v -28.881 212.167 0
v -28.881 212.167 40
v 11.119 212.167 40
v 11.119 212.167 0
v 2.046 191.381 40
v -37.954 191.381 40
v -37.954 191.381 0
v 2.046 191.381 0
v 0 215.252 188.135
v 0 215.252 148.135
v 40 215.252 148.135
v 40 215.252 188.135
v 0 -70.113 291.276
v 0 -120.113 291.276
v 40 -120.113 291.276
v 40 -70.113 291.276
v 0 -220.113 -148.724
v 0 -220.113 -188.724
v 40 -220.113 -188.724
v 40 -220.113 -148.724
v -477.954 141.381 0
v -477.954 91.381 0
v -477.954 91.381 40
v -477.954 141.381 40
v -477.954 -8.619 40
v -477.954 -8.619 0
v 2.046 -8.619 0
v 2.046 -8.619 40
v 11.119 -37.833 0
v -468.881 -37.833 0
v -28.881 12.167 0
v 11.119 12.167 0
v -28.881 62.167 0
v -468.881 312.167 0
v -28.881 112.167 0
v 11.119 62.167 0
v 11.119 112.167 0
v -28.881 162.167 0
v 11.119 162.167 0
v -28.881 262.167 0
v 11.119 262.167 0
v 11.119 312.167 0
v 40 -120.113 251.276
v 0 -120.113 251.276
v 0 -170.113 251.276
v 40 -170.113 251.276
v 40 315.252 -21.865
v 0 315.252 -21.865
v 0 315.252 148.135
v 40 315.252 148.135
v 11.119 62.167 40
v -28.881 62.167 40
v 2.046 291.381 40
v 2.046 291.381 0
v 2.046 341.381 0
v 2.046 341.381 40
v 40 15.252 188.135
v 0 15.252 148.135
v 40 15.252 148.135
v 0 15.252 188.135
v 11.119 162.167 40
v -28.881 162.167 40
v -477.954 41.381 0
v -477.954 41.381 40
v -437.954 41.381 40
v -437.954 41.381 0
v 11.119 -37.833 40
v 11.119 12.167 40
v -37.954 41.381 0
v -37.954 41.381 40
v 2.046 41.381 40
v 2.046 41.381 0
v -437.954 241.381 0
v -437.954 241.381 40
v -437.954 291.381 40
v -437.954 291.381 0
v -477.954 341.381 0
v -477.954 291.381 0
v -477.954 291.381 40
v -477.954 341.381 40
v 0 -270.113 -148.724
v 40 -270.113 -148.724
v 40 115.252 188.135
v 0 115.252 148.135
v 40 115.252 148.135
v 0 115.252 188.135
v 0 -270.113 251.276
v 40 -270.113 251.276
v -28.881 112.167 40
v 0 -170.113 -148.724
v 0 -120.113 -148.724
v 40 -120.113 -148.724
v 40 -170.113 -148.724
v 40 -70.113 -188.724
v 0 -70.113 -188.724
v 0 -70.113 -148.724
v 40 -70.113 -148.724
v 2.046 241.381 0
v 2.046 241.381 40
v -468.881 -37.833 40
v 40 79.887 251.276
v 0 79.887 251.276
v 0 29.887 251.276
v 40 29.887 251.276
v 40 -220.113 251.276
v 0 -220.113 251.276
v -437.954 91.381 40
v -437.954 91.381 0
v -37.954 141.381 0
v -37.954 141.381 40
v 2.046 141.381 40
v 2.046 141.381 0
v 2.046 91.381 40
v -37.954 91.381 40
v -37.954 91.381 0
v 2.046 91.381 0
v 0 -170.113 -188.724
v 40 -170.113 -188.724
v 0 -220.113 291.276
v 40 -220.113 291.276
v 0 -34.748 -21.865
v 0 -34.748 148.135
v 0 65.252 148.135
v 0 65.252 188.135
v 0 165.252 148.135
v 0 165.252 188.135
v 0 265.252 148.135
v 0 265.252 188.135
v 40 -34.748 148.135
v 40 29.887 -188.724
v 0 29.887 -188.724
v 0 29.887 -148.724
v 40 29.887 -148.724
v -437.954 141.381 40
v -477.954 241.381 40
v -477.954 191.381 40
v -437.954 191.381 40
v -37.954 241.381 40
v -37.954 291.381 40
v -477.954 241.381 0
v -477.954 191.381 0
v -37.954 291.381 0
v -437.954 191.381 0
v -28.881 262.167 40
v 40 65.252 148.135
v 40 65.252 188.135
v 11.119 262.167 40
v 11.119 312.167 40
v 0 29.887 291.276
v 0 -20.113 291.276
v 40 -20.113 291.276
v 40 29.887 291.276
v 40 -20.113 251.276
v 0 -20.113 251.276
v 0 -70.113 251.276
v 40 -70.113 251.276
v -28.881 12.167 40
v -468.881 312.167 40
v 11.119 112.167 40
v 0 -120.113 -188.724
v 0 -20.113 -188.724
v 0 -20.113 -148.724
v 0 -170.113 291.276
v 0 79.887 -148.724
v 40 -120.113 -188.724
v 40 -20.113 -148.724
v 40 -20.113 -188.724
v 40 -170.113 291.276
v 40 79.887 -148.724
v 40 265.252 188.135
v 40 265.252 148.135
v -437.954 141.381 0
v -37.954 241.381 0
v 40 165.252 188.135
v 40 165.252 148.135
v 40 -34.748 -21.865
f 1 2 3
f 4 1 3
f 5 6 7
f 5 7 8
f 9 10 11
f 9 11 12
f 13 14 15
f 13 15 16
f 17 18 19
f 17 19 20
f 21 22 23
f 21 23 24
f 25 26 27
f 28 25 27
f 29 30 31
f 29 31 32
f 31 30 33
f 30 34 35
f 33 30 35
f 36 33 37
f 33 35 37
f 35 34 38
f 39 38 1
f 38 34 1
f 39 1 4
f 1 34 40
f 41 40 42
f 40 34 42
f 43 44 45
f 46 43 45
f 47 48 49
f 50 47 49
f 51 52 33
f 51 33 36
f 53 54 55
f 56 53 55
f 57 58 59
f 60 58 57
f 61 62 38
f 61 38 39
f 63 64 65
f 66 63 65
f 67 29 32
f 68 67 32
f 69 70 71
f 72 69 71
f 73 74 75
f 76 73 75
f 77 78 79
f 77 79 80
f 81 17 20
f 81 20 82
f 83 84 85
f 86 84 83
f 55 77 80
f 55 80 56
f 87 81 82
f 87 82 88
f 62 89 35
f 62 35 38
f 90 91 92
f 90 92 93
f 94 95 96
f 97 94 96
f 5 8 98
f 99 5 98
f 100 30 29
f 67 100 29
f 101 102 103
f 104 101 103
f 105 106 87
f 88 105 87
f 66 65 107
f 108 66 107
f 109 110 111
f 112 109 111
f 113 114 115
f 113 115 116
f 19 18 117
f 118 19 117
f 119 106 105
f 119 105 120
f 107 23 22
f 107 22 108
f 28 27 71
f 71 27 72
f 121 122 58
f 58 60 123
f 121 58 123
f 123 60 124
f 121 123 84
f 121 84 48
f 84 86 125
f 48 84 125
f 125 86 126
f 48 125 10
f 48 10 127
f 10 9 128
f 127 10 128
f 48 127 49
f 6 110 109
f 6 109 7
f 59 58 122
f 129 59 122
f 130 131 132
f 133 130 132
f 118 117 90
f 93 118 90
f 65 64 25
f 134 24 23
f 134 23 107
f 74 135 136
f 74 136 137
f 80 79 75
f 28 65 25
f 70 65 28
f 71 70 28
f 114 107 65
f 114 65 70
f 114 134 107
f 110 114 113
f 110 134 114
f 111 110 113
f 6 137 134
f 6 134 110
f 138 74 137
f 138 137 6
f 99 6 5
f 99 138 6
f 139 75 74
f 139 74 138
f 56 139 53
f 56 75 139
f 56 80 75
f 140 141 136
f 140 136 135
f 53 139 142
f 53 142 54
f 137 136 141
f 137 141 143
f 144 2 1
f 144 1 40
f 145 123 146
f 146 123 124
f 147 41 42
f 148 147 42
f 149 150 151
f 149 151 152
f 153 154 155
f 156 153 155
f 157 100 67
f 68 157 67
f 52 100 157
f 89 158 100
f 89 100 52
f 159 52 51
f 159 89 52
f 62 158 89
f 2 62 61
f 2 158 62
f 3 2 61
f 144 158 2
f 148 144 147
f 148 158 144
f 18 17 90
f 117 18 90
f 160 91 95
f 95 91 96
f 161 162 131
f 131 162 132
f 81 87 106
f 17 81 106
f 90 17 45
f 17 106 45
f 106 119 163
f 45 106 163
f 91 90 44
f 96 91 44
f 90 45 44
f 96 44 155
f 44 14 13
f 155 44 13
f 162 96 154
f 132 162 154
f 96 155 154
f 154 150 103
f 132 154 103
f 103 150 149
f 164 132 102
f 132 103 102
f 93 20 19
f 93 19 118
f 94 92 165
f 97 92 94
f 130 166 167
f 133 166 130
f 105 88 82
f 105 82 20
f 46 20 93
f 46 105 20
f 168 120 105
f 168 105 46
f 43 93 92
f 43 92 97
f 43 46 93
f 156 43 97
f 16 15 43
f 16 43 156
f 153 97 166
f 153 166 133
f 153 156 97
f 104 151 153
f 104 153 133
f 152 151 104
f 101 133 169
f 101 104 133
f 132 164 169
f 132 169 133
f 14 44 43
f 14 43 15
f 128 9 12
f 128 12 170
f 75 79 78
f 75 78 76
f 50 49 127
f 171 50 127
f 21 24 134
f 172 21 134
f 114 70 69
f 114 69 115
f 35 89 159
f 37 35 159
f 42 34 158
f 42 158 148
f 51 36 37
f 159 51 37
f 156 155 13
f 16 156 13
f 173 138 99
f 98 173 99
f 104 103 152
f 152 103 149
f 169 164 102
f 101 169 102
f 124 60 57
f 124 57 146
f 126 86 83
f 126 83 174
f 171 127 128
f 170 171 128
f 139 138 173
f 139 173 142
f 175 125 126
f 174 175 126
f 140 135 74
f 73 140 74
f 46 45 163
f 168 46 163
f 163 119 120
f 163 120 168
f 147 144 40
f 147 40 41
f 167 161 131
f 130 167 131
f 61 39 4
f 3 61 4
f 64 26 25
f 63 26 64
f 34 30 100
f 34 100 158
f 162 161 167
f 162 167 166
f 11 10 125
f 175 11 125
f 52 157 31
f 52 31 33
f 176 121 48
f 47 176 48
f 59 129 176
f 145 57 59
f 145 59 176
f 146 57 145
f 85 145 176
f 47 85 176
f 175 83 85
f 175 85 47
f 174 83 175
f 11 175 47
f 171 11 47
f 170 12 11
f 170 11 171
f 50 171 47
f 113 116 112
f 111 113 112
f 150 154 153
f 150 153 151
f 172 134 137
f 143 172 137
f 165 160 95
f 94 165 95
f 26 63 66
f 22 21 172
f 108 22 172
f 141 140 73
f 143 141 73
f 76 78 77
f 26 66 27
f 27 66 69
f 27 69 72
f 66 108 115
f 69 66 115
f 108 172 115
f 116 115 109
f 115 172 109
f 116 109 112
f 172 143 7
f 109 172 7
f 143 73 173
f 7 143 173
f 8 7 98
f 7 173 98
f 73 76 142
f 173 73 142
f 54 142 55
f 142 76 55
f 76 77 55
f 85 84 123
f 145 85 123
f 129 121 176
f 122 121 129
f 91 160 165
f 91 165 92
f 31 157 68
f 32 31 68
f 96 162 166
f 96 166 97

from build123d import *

# Parameters (mm, degrees)
F0_W      = 480
F0_H      = 350
F1_DEPTH  = 40
F2_W      = 350
F2_H      = 480
F3_DEPTH  = 40
F4_W      = 480
F4_H      = 350
F5_DEPTH  = 40
F6_W      = 350
F6_H      = 210
F7_DEPTH  = 40
F8_W      = 85.0309615808
F8_H      = 50
F8_W_2    = 86.1803859224
F8_W_3    = 116.6401538305
F9_DEPTH  = 50
F10_W     = 74.6454365466
F10_H     = 97.6743716581
F10_W_2   = 50
F10_H_2   = 110.9500733709
F10_W_3   = 67.4985460367
F10_H_3   = 80
F10_W_4   = 63.5280413126
F10_H_4   = 101.6448592455
F10_H_5   = 128.1634595595
F10_H_6   = 114.6637674888
F10_W_5   = 84.9687599682
F10_H_7   = 125.7811841437
F11_DEPTH = 100
F12_W     = 78.3577047333
F12_H     = 50
F12_W_2   = 55.6823987415
F12_W_3   = 70.6201573807
F12_W_4   = 80.1742867282
F12_W_5   = 71.0833863297
F12_W_6   = 78.6591355512
F13_DEPTH = 50
F14_W     = 74.3059250168
F14_H     = 90.372060785
F14_W_2   = 50
F14_H_2   = 64.995960281
F14_H_3   = 67.6736311095
F14_W_3   = 72.9670965273
F14_H_4   = 79.0538373879
F15_DEPTH = 50


with BuildPart() as f1:
    # F0 (on Top) → F1 (new body)
    with BuildSketch(Plane.XY):
        with Locations((-228.8810501248, 137.1673375368)):
            Rectangle(F0_W, F0_H)
    extrude(amount=F1_DEPTH)

    # F8 (on face) → F9 (cut)
    with BuildSketch(Plane.XY.offset(40)):
        with Locations((13.6344306656, 37.1673375368)):
            Rectangle(F8_W, F8_H)
        with Locations((14.2091428364, 137.1673375368)):
            Rectangle(F8_W_2, F8_H)
        with Locations((29.4390267905, 237.1673375368)):
            Rectangle(F8_W_3, F8_H)
    extrude(amount=-F9_DEPTH, mode=Mode.SUBTRACT)


with BuildPart() as f3:
    # F2 (on Right) → F3 (new body)
    with BuildSketch(Plane.YZ):
        with Locations((-95.1133482158, 51.2756378061)):
            Rectangle(F2_W, F2_H)
    extrude(amount=F3_DEPTH)

    # F10 (on face) → F11 (cut)
    with BuildSketch(Plane(origin=(0, 0, 0), x_dir=(0, -1, 0), z_dir=(-1, 0, 0))):
        with Locations((-67.2093700575, 300.1128236351)):
            Rectangle(F10_W, F10_H)
        with Locations((45.1133482158, 306.7506744915)):
            Rectangle(F10_W_2, F10_H_2)
        with Locations((145.1133482158, 306.7506744915)):
            Rectangle(F10_W_2, F10_H_2)
        with Locations((253.8626212342, 291.2756378061)):
            Rectangle(F10_W_3, F10_H_3)
        with Locations((-61.6506724405, -199.5467918167)):
            Rectangle(F10_W_4, F10_H_4)
        with Locations((45.1133482158, -212.8060919737)):
            Rectangle(F10_W_2, F10_H_5)
        with Locations((145.1133482158, -206.0562459384)):
            Rectangle(F10_W_2, F10_H_6)
        with Locations((262.5977281999, -211.6149542658)):
            Rectangle(F10_W_5, F10_H_7)
    extrude(amount=-F11_DEPTH, mode=Mode.SUBTRACT)


with BuildPart() as f5:
    # F4 (on Top) → F5 (new body)
    with BuildSketch(Plane.XY):
        with Locations((-237.9536277056, 166.3810482249)):
            Rectangle(F4_W, F4_H)
    extrude(amount=F5_DEPTH)

    # F12 (on face) → F13 (cut)
    with BuildSketch(Plane.XY.offset(40)):
        with Locations((-477.1324800722, 266.3810482249)):
            Rectangle(F12_W, F12_H)
        with Locations((-465.7948270763, 166.3810482249)):
            Rectangle(F12_W_2, F12_H)
        with Locations((-473.2637063959, 66.3810482249)):
            Rectangle(F12_W_3, F12_H)
        with Locations((2.1335156585, 266.3810482249)):
            Rectangle(F12_W_4, F12_H)
        with Locations((-2.4119345407, 166.3810482249)):
            Rectangle(F12_W_5, F12_H)
        with Locations((1.37594007, 66.3810482249)):
            Rectangle(F12_W_6, F12_H)
    extrude(amount=-F13_DEPTH, mode=Mode.SUBTRACT)


with BuildPart() as f7:
    # F6 (on Right) → F7 (new body)
    with BuildSketch(Plane.YZ):
        with Locations((140.2520157397, 83.1350810081)):
            Rectangle(F6_W, F6_H)
    extrude(amount=F7_DEPTH)

    # F14 (on face) → F15 (cut)
    with BuildSketch(Plane(origin=(0, 0, 0), x_dir=(0, -1, 0), z_dir=(-1, 0, 0))):
        with Locations((-302.4049782481, 193.3211114006)):
            Rectangle(F14_W, F14_H)
        with Locations((-190.2520157397, 180.6330611486)):
            Rectangle(F14_W_2, F14_H_2)
        with Locations((-90.2520157397, 181.9718965628)):
            Rectangle(F14_W_2, F14_H_3)
        with Locations((21.231532524, 187.661999702)):
            Rectangle(F14_W_3, F14_H_4)
    extrude(amount=-F15_DEPTH, mode=Mode.SUBTRACT)


solid = Compound([f1.part, f3.part, f5.part, f7.part])
